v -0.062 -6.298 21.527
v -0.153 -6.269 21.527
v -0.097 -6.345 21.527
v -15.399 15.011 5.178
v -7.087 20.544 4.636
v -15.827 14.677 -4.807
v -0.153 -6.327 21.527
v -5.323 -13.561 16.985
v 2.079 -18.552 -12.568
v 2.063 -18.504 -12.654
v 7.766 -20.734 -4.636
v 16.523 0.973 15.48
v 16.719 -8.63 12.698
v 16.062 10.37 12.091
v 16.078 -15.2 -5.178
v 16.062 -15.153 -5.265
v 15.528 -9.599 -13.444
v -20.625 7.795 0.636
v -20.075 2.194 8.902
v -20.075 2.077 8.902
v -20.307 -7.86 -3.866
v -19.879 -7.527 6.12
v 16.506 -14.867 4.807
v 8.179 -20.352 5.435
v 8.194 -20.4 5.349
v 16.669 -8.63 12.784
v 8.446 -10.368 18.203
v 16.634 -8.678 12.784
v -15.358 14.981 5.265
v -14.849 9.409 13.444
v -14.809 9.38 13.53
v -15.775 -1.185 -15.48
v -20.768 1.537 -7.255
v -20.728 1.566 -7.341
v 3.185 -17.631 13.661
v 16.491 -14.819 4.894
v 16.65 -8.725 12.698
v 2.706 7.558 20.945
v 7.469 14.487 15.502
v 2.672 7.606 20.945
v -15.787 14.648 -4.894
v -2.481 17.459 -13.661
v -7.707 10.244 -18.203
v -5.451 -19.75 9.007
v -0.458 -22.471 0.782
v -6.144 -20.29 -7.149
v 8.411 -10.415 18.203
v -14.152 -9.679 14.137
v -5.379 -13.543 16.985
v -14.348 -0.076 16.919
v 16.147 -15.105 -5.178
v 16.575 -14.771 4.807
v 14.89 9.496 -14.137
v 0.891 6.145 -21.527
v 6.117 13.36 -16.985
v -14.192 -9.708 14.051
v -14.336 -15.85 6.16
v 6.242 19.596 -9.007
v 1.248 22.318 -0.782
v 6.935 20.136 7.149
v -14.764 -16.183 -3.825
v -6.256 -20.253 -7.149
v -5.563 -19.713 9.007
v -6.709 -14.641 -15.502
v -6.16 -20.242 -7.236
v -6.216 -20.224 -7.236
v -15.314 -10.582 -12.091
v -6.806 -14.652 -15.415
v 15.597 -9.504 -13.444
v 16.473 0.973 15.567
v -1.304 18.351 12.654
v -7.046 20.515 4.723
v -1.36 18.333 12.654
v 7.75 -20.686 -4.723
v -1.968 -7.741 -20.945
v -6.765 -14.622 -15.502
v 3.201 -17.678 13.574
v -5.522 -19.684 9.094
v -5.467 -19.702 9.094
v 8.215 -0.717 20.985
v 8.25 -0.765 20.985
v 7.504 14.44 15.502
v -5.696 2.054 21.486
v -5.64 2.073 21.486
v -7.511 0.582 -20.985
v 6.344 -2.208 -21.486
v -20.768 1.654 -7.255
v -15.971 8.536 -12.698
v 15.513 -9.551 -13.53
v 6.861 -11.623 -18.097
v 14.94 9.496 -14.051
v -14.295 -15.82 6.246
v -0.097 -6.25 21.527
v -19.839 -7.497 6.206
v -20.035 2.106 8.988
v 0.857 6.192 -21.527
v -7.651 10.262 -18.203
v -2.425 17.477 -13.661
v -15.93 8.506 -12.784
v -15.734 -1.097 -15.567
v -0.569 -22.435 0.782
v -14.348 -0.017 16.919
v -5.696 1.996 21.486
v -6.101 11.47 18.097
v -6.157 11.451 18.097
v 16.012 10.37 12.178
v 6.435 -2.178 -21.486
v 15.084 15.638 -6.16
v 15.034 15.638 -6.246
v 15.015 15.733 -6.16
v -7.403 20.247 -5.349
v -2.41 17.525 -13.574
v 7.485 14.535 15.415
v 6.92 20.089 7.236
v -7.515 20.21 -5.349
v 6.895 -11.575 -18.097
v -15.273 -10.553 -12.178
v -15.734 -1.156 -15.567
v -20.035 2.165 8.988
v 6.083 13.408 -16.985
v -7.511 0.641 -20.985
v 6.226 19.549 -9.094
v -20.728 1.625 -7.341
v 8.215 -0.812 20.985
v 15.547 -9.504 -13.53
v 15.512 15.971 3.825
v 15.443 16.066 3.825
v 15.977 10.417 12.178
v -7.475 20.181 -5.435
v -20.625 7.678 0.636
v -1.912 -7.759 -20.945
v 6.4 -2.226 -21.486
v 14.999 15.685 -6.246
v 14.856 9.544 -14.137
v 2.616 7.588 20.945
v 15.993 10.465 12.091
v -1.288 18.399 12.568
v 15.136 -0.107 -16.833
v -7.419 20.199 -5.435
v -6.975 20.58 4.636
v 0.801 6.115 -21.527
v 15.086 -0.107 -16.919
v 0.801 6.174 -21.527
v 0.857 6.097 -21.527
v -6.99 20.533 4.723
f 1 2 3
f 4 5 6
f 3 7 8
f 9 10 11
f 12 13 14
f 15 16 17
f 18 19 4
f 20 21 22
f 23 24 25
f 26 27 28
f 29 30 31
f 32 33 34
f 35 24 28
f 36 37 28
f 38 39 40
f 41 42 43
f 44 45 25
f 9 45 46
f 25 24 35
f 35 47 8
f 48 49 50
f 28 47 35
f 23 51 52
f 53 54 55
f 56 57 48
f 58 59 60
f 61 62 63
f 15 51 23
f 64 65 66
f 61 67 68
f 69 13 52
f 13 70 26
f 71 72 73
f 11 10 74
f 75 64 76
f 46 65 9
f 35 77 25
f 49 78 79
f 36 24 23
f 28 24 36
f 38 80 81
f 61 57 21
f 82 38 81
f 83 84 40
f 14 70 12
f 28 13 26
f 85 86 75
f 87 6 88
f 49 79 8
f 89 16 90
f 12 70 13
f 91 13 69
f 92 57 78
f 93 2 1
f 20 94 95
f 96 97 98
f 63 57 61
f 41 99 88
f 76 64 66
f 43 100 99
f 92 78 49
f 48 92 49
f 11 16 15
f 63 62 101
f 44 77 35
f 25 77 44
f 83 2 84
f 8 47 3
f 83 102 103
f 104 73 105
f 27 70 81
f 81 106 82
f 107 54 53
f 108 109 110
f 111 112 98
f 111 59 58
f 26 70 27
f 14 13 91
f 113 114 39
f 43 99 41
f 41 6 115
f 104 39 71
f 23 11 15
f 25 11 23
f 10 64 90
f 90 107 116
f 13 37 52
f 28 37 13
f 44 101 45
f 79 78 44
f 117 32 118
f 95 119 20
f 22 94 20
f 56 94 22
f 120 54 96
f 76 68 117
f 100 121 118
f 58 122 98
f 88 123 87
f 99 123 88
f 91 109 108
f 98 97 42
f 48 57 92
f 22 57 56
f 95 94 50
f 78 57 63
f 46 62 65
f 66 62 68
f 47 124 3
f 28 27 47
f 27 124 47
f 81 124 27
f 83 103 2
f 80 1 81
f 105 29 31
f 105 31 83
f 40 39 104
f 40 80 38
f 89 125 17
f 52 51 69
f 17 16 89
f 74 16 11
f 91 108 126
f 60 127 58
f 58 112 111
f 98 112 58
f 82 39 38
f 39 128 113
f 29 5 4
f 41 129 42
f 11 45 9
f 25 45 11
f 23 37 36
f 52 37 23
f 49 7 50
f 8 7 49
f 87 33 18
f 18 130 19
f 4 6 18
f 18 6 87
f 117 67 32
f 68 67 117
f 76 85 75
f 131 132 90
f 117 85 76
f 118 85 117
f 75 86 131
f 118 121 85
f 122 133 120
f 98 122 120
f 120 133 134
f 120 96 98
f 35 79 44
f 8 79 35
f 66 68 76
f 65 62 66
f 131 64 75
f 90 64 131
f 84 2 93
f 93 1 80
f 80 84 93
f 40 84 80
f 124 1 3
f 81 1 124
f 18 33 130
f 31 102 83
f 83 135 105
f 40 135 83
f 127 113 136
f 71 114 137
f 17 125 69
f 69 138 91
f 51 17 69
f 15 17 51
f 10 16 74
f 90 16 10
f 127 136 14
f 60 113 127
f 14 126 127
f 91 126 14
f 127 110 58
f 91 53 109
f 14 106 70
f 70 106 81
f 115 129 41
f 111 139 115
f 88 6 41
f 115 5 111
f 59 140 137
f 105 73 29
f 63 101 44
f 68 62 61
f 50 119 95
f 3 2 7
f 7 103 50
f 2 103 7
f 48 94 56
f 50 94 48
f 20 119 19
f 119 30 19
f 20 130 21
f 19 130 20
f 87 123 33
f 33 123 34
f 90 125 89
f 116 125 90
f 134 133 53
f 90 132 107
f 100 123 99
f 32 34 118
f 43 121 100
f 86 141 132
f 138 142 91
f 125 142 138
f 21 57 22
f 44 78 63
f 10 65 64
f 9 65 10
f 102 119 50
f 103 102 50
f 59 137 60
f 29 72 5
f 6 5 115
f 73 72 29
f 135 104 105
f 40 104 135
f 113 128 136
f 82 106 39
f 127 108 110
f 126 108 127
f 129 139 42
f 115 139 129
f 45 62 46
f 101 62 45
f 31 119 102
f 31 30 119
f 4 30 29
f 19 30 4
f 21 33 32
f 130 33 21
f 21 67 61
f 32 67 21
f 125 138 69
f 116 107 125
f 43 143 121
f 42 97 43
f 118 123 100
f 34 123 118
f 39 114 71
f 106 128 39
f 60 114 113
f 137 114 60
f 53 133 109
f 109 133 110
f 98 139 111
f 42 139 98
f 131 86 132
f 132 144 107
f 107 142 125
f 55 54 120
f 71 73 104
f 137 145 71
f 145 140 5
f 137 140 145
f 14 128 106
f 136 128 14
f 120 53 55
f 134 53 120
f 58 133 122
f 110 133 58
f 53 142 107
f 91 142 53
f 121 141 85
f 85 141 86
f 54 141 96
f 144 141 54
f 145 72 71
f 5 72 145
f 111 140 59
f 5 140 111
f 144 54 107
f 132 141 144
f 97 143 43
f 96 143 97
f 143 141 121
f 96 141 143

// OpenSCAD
// Auto-generated OpenSCAD file

    inner_points = 10*[[1.6046801444042071, -1.510518771363498, -0.51780774687208], [-0.7434345422794115, 2.015149679052852, -0.5348754332596579], [0.7734765787975868, -2.063842760532919, -0.4636487630145585], [-1.5746381078860319, 1.4618256898834308, -0.4807164494021364], [1.647527110349813, -1.4771486205669213, 0.4807164494021364], [-0.7005875763338056, 2.0485198298494285, 0.4636487630145585], [0.8163235447431927, -2.0304726097363424, 0.5348754332596579], [-1.531791141940426, 1.4951958406800074, 0.51780774687208], [0.6384522963590755, -0.21782729456619615, -2.1399731111236644], [0.08413761133612133, 0.6144701258584091, -2.1440022453297805], [-0.1927512692475448, -0.7711512837356173, -2.085814127266143], [-0.7470659542704989, 0.06114613668898816, -2.089843261472259], [0.8199549567342801, -0.0764690673724786, 2.089843261472259], [0.26564027171132587, 0.7558283530521267, 2.085814127266143], [-0.011248608872340221, -0.6297930565418997, 2.1440022453297805], [-0.5655632938952944, 0.2025043638827057, 2.1399731111236644], [1.4983810792725356, 1.5637611853237816, -0.6159872338465537], [-1.4683390427543601, -1.6124542668038486, -0.3825369624276627], [-2.0226537277773144, -0.7801568463792433, -0.38656609663377894], [1.5412280452181413, 1.597131336120358, 0.3825369624276627], [-1.4254920768087544, -1.5790841160072722, 0.6159872338465537], [-1.9798067618317083, -0.7467866955826666, 0.6119580996404375], [0.12173940895788779, 2.2222892177989073, -0.07818380251905571], [-0.048850406494106685, -2.237612148482398, 0.07818380251905571], [-2.054379777370347, 0.7736682073626848, 0.0636062580160924], [0.6845409546055283, -1.1575201029478461, -1.8010730352062194], [-0.7666737312477581, 1.0214628324726316, -1.8116214455030666], [0.8395627337115392, -1.0367857631561221, 1.8116214455030666], [-0.6116519521417472, 1.1421971722643556, 1.8010730352062194], [1.4840184706191157, 0.9496289399635032, -1.4050596644138698], [-1.5233042813157396, -1.0523160596421408, -1.2091106200212], [1.5961932837795207, 1.0369931289586503, 1.2091106200212], [-1.4111294681553346, -0.9649518706469937, 1.4050596644138698], [1.549714905842828, -0.9503805642017904, -1.3443814044656173], [-0.2440850958178369, 1.7429904657899544, -1.357419956647079], [0.2047992851212129, -1.845677585468592, -1.2567503277879908], [-1.5890007165394517, 0.8476934445231528, -1.2697888799694526], [1.661889719003233, -0.8630163752066433, 1.2697888799694526], [-0.1319102826574318, 1.8303546547851015, 1.2567503277879908], [0.31697409828161804, -1.758313396473445, 1.357419956647079], [-1.4768259033790467, 0.9350576335182998, 1.3443814044656173], [1.5036262475963749, -0.010687755820140424, -1.683281480383062], [0.6067262467660426, 1.335997759175732, -1.689800756473793], [-0.6724929387318603, -1.4593087662563635, -1.541491419847914], [-1.5693929395621924, -0.11262325126049072, -1.5480106959386448], [1.6422819420259736, 0.09730032057700028, 1.5480106959386448], [0.7453819411956415, 1.443985835572873, 1.541491419847914], [-0.5338372443022614, -1.3513206898592225, 1.689800756473793], [-1.4307372451325937, -0.004635174863350026, 1.683281480383062], [0.6210888554194628, 1.9501300045360104, -0.9007283259064769], [-0.617527700170481, -2.0194469734180718, -0.7149177622543765], [-2.0687423860237675, 0.15953596200240622, -0.7254661725512236], [0.6904167026342621, 2.0041240427345812, 0.7149177622543765], [-0.5481998529556816, -1.965452935219501, 0.9007283259064769], [-1.999414538808968, 0.21353000020097673, 0.8901799156096298]];

    outer_points = 10*[[1.6418145044797559, -1.472026782007085, 0.35163939402966377], [-0.4298446701047658, 2.033447834240434, -0.8163280238391935], [0.9209550497834971, -2.033447834240434, -0.05476932719099553], [-1.1507041248010244, 1.472026782007085, -1.2227367450598527], [1.1507041248010244, -1.472026782007085, 1.2227367450598527], [-0.9209550497834971, 2.033447834240434, 0.05476932719099553], [0.4298446701047658, -2.033447834240434, 0.8163280238391935], [-1.6418145044797559, 1.472026782007085, -0.35163939402966377], [1.6451443994420738, -0.13305462530052709, -1.5039495833206327], [1.156092008029022, 0.6944756775338761, -1.7796692894425854], [0.924284944745815, -0.6944756775338761, -1.910358304541292], [0.43523255333276334, 0.13305462530052709, -2.1860780106632447], [-0.43523255333276334, -0.13305462530052709, 2.1860780106632447], [-0.924284944745815, 0.6944756775338761, 1.910358304541292], [-1.156092008029022, -0.6944756775338761, 1.7796692894425854], [-1.6451443994420738, 0.13305462530052709, 1.5039495833206327], [1.5278338202912307, 1.602874022047165, 0.287378956293666], [-1.0367234406124997, -1.602874022047165, -1.158476307323855], [-1.525775832025551, -0.7753437192127617, -1.4341960134458078], [1.0367234406124997, 1.602874022047165, 1.158476307323855], [-1.5278338202912307, -1.602874022047165, -0.287378956293666], [-2.0168862117042825, -0.7753437192127617, -0.5630986624156187], [0.05891318954734109, 2.231926079561001, 0.03321428868135433], [-0.05891318954734109, -2.231926079561001, -0.03321428868135433], [-1.8283213639591795, 0.7621066828143632, -1.0307775567987123], [1.5286049144521512, -1.0832512297704806, -1.2149081307709086], [0.24824913145336436, 1.0832512297704806, -1.9367516927663138], [-0.24824913145336436, -1.0832512297704806, 1.9367516927663138], [-1.5286049144521512, 1.0832512297704806, 1.2149081307709086], [1.9469188372147817, 1.0156202244899935, -0.4050809529031537], [-0.6611751709879975, -1.0156202244899935, -1.8754815196038797], [0.6611751709879975, 1.0156202244899935, 1.8754815196038797], [-1.9469188372147817, -1.0156202244899935, 0.4050809529031537], [2.017362774104258, -0.8847729844499134, -0.36536581825036085], [0.434755990932788, 1.793171328963202, -1.2576135299972653], [0.8509876752939962, -1.793171328963202, -1.022948942509768], [-0.7316191078774735, 0.8847729844499134, -1.9151966542566723], [0.7316191078774735, -0.8847729844499134, 1.9151966542566723], [-0.8509876752939962, 1.793171328963202, 1.022948942509768], [-0.434755990932788, -1.793171328963202, 1.2576135299972653], [-2.017362774104258, 0.8847729844499134, 0.36536581825036085], [2.1339022590941807, 0.0654236200200401, -0.6544072708000847], [1.3425988675084457, 1.4043957767265978, -1.100531126673537], [0.24666770558766005, -1.4043957767265978, -1.7183991162801513], [-0.5446356859980751, -0.0654236200200401, -2.1645229721536037], [0.5446356859980751, 0.0654236200200401, 2.1645229721536037], [-0.24666770558766005, 1.4043957767265978, 1.7183991162801513], [-1.3425988675084457, -1.4043957767265978, 1.100531126673537], [-2.1339022590941807, -0.0654236200200401, 0.6544072708000847], [0.9235138505848948, 1.9916495742837694, -0.4080712174767174], [-0.12888056403684184, -1.9916495742837694, -1.0013939040001267], [-1.4092363470356286, 0.17485288525719178, -1.7232374659955318], [0.12888056403684184, 1.9916495742837694, 1.0013939040001267], [-0.9235138505848948, -1.9916495742837694, 0.4080712174767174], [-2.2038696335836816, 0.17485288525719178, -0.31377234451868774]];

    // Convex hull for inner set (I)
    module inner_hull() {
        hull() {
            for (p = inner_points) {
                translate(p) sphere(r=0.1);
            }
        }
    }

    // Convex hull for outer set (O) minus inner hull (O \ I)
    module outer_minus_inner() {
        difference() {
            hull() {
                for (p = outer_points) {
                    translate(p) sphere(r=0.1);
                }
            }
            inner_hull(); // Subtract inner hull
        }
    }

    // Convex hull for outer set (O) minus all translated inner hulls
    module outer_minus_AllTranslationInner() {
        difference() {
            hull() {
                for (p = outer_points) {
                    translate(p) sphere(r=0.1);
                }
            }
            hull() {
                translate([0,0,50]) inner_hull();
                translate([0,0,-50]) inner_hull();
            }; // Subtract translated inner hulls
        }
    }

    // Difference between outer_minus_inner and outer_minus_AllTranslationInner
    module outer_minus_inner_diff() {
        difference() {
            // Outer minus inner
            difference() {
                hull() {
                    for (p = outer_points) {
                        translate(p) sphere(r=0.1);
                    }
                }
                inner_hull();
            }

            // Subtract Outer minus AllTranslationInner
            difference() {
                hull() {
                    for (p = outer_points) {
                        translate(p) sphere(r=0.1);
                    }
                }
                hull() {
                    translate([0,0,50]) inner_hull();
                    translate([0,0,-50]) inner_hull();
                };
            }
        }
    }

    // Rendering all with colors applied
    color([1, 0, 0, 0.5]) inner_hull(); // Transparent red
    
